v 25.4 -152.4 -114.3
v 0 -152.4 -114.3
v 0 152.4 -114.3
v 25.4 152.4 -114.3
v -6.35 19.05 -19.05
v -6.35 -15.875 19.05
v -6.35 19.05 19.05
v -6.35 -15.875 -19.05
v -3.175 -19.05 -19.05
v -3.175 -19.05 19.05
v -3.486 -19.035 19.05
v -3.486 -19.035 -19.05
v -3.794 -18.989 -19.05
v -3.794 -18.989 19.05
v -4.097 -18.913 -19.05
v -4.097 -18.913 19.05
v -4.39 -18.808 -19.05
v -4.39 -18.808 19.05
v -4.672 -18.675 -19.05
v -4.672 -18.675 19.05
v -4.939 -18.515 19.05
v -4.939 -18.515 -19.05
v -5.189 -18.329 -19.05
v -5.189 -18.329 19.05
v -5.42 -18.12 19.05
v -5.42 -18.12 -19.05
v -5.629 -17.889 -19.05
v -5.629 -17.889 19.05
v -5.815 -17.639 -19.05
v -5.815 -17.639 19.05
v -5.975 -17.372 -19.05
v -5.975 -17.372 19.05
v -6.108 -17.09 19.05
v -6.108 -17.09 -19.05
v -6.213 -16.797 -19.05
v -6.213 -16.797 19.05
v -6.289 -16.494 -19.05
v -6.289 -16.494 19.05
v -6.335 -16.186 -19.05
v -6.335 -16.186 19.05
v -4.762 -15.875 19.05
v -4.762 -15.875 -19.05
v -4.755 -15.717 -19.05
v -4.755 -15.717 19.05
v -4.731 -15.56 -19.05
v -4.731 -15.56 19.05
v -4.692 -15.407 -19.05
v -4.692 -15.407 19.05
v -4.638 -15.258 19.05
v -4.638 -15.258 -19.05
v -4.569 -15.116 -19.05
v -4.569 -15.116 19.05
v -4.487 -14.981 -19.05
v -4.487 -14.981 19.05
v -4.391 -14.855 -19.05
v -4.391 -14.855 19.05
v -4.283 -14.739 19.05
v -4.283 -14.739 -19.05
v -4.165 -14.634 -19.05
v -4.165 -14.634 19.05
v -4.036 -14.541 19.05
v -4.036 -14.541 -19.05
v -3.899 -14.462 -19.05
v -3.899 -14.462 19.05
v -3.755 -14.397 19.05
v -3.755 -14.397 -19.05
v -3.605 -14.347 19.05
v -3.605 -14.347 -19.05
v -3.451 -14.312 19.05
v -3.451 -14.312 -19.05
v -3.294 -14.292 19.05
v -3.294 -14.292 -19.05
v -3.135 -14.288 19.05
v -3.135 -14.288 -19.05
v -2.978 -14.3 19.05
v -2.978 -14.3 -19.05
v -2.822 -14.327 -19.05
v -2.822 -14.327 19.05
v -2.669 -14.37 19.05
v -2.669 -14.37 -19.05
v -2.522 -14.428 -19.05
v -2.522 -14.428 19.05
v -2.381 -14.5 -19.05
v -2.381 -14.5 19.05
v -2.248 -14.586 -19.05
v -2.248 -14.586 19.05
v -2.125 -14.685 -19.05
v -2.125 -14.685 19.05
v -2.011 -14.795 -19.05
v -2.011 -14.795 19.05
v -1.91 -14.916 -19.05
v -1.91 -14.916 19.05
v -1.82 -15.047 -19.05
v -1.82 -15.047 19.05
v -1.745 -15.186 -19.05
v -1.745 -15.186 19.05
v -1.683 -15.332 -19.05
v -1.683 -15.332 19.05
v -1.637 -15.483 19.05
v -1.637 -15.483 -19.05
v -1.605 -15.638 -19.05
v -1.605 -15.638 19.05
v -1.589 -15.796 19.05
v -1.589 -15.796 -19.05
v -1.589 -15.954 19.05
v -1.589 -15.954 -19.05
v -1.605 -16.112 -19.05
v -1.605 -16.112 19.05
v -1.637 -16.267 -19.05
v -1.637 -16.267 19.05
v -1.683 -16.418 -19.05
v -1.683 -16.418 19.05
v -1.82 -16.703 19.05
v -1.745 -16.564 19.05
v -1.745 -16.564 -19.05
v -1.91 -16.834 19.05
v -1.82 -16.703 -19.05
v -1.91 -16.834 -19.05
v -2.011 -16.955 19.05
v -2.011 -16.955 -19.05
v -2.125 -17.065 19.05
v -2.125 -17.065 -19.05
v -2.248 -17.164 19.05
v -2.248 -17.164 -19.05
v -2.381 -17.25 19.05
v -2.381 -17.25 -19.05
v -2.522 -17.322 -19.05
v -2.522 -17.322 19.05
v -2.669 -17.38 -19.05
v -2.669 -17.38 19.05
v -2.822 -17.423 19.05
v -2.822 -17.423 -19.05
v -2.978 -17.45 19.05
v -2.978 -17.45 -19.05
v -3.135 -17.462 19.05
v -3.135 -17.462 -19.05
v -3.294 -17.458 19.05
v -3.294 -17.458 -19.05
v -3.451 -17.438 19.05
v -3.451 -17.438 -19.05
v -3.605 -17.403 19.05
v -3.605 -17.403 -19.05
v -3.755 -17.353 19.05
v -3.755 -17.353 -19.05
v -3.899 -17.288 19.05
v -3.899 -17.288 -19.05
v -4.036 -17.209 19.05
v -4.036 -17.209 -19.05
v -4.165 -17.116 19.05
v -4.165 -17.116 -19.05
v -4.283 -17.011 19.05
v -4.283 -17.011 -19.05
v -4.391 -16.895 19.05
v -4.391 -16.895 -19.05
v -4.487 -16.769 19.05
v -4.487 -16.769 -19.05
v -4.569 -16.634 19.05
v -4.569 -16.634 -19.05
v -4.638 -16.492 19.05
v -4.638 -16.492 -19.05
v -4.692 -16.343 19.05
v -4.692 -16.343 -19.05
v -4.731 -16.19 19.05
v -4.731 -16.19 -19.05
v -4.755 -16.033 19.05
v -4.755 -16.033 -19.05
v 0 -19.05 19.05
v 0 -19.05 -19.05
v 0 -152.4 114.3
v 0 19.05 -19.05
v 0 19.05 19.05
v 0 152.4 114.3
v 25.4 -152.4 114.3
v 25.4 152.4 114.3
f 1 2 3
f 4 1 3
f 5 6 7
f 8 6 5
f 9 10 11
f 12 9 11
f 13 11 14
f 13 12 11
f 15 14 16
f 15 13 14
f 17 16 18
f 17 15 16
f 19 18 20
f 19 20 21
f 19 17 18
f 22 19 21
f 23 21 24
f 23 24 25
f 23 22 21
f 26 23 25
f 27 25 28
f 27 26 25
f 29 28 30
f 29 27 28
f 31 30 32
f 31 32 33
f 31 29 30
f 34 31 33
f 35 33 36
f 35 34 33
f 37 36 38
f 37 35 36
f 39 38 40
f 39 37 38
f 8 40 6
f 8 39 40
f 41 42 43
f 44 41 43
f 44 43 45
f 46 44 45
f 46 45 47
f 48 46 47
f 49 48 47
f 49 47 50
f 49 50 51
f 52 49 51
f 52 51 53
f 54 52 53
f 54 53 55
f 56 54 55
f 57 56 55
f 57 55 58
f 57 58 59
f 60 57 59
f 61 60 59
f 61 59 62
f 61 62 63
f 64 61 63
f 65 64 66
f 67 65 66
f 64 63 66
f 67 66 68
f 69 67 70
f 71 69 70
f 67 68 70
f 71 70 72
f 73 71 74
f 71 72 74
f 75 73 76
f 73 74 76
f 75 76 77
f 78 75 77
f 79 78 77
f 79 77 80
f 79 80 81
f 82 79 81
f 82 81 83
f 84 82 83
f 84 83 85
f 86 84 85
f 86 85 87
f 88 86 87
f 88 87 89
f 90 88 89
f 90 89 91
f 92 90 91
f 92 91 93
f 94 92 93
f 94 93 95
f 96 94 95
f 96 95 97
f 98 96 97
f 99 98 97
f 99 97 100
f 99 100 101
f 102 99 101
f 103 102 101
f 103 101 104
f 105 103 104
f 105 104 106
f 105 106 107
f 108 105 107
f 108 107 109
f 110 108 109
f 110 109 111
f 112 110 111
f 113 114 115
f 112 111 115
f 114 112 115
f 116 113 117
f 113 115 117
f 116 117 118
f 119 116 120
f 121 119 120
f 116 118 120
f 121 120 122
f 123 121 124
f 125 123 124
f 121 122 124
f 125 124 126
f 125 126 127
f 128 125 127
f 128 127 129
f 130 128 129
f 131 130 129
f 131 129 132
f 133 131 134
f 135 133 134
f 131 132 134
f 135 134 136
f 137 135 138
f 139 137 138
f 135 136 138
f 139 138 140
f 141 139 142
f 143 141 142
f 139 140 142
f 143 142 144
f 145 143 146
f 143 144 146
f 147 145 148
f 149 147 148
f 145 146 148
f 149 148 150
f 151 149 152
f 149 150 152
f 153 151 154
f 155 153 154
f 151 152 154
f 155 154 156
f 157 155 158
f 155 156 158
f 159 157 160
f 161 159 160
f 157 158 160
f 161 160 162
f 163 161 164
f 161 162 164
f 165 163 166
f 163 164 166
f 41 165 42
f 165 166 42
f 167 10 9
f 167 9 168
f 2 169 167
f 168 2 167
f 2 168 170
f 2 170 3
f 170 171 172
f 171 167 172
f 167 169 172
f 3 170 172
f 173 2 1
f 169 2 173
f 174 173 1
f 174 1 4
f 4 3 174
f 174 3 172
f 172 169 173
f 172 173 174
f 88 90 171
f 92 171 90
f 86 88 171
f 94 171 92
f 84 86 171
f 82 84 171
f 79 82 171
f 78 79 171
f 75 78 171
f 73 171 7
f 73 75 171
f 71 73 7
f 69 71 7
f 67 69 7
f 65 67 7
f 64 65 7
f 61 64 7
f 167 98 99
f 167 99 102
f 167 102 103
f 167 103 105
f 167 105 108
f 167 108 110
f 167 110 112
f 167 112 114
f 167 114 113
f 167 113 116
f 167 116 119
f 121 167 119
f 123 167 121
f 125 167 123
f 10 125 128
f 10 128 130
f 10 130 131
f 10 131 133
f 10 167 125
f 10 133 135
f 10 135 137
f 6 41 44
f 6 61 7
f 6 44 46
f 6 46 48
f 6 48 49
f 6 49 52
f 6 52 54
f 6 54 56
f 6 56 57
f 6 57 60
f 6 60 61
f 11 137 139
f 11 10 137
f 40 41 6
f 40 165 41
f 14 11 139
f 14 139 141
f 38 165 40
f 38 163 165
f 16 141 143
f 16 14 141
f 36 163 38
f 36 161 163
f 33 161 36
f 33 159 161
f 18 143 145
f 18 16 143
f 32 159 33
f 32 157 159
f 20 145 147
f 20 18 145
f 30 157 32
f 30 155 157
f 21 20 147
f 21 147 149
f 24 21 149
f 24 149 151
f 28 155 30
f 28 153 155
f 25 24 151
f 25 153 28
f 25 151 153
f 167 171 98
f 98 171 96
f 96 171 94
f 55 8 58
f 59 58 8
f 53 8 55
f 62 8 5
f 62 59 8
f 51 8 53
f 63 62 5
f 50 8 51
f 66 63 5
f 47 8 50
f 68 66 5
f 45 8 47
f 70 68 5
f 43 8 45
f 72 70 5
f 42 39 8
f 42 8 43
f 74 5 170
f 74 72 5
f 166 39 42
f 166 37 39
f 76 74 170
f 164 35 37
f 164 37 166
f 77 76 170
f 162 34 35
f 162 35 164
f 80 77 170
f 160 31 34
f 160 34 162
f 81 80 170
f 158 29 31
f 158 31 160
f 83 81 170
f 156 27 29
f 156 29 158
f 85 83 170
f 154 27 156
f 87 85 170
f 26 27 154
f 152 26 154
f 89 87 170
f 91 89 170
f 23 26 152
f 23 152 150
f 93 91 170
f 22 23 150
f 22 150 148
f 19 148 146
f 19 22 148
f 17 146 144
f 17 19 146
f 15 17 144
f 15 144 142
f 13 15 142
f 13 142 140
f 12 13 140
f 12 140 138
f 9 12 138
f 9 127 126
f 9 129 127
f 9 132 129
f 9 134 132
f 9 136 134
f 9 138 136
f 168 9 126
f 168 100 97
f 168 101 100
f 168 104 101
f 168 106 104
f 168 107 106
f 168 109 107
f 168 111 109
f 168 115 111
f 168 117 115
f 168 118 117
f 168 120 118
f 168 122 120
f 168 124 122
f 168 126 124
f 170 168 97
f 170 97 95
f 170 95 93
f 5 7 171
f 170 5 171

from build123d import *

# Parameters (mm, degrees)
F0_W     = 304.8
F0_H     = 228.6
F1_DEPTH = 25.4
F3_DEPTH = 19.05
F5_D     = 3.175
F6_R     = 3.175


with BuildPart() as f1:
    # F0 (on Right) → F1 (new body)
    with BuildSketch(Plane.YZ):
        Rectangle(F0_W, F0_H)
    extrude(amount=F1_DEPTH)

    # F2 (on Front) → F3 (join, symmetric)
    with BuildSketch(Plane.XZ):
        Polygon((0, -19.05), (0, 19.05), (-3.175, 19.05), (-6.35, 19.05), (-6.35, -19.05), (-3.175, -19.05), align=None)
    extrude(amount=F3_DEPTH, both=True)

    # F5 (through all)
    with Locations(Plane.XY.offset(19.05)):
        with Locations((-3.175, -15.875)):
            Hole(F5_D / 2)

    # F6
    f6_edges = [f1.edges().sort_by_distance(p)[0] for p in [
        (-6.35, -19.05, 0),
    ]]
    fillet(f6_edges, radius=F6_R)


solid = f1.part
